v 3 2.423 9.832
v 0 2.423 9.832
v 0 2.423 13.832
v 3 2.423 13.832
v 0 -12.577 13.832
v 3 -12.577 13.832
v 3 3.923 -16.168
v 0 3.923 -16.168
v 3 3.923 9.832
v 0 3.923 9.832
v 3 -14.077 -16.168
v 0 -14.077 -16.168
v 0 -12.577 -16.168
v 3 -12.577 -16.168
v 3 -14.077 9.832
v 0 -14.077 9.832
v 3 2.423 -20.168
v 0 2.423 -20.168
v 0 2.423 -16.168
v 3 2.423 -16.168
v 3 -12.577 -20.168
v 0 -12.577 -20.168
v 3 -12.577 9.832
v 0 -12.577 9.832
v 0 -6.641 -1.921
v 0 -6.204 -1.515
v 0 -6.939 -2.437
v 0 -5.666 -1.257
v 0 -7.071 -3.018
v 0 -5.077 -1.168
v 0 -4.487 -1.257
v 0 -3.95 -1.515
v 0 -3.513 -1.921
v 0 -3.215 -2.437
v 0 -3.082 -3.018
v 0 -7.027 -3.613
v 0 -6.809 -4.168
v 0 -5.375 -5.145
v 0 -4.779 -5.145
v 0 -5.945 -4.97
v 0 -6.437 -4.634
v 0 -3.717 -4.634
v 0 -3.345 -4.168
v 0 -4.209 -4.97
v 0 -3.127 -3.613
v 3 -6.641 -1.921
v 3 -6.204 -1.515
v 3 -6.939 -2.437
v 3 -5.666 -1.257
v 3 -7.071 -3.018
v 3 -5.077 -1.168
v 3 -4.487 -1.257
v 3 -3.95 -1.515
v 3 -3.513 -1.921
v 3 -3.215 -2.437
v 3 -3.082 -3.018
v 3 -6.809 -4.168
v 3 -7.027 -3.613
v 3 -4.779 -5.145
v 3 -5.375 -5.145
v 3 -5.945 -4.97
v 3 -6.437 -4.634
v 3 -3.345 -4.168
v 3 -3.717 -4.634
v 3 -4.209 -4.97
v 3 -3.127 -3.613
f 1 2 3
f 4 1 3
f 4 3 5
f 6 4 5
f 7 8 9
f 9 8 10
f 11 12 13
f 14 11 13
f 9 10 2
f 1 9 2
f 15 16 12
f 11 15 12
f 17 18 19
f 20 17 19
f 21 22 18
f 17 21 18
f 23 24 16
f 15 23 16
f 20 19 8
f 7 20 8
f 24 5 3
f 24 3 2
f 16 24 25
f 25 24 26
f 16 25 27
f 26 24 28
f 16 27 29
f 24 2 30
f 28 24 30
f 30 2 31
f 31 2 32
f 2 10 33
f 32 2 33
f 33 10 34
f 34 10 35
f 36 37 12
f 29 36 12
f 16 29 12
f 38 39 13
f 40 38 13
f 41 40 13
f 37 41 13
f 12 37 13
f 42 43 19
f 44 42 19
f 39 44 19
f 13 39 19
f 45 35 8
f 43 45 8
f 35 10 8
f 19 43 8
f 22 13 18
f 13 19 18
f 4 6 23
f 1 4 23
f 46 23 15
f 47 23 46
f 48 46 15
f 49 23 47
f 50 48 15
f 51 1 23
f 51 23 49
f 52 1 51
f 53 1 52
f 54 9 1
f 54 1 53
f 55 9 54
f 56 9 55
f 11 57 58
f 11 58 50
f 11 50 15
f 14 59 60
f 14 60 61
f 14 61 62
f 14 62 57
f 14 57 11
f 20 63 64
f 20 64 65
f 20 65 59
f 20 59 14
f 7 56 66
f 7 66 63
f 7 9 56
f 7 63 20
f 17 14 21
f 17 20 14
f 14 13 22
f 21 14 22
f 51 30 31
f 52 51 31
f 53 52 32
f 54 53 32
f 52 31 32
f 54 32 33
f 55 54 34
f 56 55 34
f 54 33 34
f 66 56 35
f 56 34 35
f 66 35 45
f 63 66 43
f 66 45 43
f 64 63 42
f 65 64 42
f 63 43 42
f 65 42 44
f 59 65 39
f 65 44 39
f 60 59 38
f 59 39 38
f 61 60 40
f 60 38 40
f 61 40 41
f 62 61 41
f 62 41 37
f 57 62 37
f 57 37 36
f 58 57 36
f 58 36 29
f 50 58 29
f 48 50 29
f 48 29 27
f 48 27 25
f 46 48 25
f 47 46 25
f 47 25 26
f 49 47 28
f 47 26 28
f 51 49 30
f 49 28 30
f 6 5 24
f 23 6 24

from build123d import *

# Parameters (mm, degrees)
BOSS_EXTRUDE1_DEPTH = 3
SKETCH2_R           = 2
CUT_EXTRUDE1_DEPTH  = 3


with BuildPart() as part:
    # Sketch1 → Boss-Extrude1 (new body)
    with BuildSketch(Plane(origin=(0, 0, 0), x_dir=(0, 0, -1), z_dir=(1, 0, 0))):
        Polygon((-9.832231839, 2.423101367), (-13.832231839, 2.423101367), (-13.832231839, -12.576898633), (-9.832231839, -12.576898633), (-9.832231839, -14.076898633), (16.167768161, -14.076898633), (16.167768161, -12.576898633), (20.167768161, -12.576898633), (20.167768161, 2.423101367), (16.167768161, 2.423101367), (16.167768161, 3.923101367), (-9.832231839, 3.923101367), align=None)
    extrude(amount=BOSS_EXTRUDE1_DEPTH)

    # Sketch2 → Cut-Extrude1 (cut)
    with BuildSketch(Plane.ZY):
        with Locations((-3.167768161, -5.076898633)):
            Circle(SKETCH2_R)
    extrude(amount=-CUT_EXTRUDE1_DEPTH, mode=Mode.SUBTRACT)


solid = part.part
